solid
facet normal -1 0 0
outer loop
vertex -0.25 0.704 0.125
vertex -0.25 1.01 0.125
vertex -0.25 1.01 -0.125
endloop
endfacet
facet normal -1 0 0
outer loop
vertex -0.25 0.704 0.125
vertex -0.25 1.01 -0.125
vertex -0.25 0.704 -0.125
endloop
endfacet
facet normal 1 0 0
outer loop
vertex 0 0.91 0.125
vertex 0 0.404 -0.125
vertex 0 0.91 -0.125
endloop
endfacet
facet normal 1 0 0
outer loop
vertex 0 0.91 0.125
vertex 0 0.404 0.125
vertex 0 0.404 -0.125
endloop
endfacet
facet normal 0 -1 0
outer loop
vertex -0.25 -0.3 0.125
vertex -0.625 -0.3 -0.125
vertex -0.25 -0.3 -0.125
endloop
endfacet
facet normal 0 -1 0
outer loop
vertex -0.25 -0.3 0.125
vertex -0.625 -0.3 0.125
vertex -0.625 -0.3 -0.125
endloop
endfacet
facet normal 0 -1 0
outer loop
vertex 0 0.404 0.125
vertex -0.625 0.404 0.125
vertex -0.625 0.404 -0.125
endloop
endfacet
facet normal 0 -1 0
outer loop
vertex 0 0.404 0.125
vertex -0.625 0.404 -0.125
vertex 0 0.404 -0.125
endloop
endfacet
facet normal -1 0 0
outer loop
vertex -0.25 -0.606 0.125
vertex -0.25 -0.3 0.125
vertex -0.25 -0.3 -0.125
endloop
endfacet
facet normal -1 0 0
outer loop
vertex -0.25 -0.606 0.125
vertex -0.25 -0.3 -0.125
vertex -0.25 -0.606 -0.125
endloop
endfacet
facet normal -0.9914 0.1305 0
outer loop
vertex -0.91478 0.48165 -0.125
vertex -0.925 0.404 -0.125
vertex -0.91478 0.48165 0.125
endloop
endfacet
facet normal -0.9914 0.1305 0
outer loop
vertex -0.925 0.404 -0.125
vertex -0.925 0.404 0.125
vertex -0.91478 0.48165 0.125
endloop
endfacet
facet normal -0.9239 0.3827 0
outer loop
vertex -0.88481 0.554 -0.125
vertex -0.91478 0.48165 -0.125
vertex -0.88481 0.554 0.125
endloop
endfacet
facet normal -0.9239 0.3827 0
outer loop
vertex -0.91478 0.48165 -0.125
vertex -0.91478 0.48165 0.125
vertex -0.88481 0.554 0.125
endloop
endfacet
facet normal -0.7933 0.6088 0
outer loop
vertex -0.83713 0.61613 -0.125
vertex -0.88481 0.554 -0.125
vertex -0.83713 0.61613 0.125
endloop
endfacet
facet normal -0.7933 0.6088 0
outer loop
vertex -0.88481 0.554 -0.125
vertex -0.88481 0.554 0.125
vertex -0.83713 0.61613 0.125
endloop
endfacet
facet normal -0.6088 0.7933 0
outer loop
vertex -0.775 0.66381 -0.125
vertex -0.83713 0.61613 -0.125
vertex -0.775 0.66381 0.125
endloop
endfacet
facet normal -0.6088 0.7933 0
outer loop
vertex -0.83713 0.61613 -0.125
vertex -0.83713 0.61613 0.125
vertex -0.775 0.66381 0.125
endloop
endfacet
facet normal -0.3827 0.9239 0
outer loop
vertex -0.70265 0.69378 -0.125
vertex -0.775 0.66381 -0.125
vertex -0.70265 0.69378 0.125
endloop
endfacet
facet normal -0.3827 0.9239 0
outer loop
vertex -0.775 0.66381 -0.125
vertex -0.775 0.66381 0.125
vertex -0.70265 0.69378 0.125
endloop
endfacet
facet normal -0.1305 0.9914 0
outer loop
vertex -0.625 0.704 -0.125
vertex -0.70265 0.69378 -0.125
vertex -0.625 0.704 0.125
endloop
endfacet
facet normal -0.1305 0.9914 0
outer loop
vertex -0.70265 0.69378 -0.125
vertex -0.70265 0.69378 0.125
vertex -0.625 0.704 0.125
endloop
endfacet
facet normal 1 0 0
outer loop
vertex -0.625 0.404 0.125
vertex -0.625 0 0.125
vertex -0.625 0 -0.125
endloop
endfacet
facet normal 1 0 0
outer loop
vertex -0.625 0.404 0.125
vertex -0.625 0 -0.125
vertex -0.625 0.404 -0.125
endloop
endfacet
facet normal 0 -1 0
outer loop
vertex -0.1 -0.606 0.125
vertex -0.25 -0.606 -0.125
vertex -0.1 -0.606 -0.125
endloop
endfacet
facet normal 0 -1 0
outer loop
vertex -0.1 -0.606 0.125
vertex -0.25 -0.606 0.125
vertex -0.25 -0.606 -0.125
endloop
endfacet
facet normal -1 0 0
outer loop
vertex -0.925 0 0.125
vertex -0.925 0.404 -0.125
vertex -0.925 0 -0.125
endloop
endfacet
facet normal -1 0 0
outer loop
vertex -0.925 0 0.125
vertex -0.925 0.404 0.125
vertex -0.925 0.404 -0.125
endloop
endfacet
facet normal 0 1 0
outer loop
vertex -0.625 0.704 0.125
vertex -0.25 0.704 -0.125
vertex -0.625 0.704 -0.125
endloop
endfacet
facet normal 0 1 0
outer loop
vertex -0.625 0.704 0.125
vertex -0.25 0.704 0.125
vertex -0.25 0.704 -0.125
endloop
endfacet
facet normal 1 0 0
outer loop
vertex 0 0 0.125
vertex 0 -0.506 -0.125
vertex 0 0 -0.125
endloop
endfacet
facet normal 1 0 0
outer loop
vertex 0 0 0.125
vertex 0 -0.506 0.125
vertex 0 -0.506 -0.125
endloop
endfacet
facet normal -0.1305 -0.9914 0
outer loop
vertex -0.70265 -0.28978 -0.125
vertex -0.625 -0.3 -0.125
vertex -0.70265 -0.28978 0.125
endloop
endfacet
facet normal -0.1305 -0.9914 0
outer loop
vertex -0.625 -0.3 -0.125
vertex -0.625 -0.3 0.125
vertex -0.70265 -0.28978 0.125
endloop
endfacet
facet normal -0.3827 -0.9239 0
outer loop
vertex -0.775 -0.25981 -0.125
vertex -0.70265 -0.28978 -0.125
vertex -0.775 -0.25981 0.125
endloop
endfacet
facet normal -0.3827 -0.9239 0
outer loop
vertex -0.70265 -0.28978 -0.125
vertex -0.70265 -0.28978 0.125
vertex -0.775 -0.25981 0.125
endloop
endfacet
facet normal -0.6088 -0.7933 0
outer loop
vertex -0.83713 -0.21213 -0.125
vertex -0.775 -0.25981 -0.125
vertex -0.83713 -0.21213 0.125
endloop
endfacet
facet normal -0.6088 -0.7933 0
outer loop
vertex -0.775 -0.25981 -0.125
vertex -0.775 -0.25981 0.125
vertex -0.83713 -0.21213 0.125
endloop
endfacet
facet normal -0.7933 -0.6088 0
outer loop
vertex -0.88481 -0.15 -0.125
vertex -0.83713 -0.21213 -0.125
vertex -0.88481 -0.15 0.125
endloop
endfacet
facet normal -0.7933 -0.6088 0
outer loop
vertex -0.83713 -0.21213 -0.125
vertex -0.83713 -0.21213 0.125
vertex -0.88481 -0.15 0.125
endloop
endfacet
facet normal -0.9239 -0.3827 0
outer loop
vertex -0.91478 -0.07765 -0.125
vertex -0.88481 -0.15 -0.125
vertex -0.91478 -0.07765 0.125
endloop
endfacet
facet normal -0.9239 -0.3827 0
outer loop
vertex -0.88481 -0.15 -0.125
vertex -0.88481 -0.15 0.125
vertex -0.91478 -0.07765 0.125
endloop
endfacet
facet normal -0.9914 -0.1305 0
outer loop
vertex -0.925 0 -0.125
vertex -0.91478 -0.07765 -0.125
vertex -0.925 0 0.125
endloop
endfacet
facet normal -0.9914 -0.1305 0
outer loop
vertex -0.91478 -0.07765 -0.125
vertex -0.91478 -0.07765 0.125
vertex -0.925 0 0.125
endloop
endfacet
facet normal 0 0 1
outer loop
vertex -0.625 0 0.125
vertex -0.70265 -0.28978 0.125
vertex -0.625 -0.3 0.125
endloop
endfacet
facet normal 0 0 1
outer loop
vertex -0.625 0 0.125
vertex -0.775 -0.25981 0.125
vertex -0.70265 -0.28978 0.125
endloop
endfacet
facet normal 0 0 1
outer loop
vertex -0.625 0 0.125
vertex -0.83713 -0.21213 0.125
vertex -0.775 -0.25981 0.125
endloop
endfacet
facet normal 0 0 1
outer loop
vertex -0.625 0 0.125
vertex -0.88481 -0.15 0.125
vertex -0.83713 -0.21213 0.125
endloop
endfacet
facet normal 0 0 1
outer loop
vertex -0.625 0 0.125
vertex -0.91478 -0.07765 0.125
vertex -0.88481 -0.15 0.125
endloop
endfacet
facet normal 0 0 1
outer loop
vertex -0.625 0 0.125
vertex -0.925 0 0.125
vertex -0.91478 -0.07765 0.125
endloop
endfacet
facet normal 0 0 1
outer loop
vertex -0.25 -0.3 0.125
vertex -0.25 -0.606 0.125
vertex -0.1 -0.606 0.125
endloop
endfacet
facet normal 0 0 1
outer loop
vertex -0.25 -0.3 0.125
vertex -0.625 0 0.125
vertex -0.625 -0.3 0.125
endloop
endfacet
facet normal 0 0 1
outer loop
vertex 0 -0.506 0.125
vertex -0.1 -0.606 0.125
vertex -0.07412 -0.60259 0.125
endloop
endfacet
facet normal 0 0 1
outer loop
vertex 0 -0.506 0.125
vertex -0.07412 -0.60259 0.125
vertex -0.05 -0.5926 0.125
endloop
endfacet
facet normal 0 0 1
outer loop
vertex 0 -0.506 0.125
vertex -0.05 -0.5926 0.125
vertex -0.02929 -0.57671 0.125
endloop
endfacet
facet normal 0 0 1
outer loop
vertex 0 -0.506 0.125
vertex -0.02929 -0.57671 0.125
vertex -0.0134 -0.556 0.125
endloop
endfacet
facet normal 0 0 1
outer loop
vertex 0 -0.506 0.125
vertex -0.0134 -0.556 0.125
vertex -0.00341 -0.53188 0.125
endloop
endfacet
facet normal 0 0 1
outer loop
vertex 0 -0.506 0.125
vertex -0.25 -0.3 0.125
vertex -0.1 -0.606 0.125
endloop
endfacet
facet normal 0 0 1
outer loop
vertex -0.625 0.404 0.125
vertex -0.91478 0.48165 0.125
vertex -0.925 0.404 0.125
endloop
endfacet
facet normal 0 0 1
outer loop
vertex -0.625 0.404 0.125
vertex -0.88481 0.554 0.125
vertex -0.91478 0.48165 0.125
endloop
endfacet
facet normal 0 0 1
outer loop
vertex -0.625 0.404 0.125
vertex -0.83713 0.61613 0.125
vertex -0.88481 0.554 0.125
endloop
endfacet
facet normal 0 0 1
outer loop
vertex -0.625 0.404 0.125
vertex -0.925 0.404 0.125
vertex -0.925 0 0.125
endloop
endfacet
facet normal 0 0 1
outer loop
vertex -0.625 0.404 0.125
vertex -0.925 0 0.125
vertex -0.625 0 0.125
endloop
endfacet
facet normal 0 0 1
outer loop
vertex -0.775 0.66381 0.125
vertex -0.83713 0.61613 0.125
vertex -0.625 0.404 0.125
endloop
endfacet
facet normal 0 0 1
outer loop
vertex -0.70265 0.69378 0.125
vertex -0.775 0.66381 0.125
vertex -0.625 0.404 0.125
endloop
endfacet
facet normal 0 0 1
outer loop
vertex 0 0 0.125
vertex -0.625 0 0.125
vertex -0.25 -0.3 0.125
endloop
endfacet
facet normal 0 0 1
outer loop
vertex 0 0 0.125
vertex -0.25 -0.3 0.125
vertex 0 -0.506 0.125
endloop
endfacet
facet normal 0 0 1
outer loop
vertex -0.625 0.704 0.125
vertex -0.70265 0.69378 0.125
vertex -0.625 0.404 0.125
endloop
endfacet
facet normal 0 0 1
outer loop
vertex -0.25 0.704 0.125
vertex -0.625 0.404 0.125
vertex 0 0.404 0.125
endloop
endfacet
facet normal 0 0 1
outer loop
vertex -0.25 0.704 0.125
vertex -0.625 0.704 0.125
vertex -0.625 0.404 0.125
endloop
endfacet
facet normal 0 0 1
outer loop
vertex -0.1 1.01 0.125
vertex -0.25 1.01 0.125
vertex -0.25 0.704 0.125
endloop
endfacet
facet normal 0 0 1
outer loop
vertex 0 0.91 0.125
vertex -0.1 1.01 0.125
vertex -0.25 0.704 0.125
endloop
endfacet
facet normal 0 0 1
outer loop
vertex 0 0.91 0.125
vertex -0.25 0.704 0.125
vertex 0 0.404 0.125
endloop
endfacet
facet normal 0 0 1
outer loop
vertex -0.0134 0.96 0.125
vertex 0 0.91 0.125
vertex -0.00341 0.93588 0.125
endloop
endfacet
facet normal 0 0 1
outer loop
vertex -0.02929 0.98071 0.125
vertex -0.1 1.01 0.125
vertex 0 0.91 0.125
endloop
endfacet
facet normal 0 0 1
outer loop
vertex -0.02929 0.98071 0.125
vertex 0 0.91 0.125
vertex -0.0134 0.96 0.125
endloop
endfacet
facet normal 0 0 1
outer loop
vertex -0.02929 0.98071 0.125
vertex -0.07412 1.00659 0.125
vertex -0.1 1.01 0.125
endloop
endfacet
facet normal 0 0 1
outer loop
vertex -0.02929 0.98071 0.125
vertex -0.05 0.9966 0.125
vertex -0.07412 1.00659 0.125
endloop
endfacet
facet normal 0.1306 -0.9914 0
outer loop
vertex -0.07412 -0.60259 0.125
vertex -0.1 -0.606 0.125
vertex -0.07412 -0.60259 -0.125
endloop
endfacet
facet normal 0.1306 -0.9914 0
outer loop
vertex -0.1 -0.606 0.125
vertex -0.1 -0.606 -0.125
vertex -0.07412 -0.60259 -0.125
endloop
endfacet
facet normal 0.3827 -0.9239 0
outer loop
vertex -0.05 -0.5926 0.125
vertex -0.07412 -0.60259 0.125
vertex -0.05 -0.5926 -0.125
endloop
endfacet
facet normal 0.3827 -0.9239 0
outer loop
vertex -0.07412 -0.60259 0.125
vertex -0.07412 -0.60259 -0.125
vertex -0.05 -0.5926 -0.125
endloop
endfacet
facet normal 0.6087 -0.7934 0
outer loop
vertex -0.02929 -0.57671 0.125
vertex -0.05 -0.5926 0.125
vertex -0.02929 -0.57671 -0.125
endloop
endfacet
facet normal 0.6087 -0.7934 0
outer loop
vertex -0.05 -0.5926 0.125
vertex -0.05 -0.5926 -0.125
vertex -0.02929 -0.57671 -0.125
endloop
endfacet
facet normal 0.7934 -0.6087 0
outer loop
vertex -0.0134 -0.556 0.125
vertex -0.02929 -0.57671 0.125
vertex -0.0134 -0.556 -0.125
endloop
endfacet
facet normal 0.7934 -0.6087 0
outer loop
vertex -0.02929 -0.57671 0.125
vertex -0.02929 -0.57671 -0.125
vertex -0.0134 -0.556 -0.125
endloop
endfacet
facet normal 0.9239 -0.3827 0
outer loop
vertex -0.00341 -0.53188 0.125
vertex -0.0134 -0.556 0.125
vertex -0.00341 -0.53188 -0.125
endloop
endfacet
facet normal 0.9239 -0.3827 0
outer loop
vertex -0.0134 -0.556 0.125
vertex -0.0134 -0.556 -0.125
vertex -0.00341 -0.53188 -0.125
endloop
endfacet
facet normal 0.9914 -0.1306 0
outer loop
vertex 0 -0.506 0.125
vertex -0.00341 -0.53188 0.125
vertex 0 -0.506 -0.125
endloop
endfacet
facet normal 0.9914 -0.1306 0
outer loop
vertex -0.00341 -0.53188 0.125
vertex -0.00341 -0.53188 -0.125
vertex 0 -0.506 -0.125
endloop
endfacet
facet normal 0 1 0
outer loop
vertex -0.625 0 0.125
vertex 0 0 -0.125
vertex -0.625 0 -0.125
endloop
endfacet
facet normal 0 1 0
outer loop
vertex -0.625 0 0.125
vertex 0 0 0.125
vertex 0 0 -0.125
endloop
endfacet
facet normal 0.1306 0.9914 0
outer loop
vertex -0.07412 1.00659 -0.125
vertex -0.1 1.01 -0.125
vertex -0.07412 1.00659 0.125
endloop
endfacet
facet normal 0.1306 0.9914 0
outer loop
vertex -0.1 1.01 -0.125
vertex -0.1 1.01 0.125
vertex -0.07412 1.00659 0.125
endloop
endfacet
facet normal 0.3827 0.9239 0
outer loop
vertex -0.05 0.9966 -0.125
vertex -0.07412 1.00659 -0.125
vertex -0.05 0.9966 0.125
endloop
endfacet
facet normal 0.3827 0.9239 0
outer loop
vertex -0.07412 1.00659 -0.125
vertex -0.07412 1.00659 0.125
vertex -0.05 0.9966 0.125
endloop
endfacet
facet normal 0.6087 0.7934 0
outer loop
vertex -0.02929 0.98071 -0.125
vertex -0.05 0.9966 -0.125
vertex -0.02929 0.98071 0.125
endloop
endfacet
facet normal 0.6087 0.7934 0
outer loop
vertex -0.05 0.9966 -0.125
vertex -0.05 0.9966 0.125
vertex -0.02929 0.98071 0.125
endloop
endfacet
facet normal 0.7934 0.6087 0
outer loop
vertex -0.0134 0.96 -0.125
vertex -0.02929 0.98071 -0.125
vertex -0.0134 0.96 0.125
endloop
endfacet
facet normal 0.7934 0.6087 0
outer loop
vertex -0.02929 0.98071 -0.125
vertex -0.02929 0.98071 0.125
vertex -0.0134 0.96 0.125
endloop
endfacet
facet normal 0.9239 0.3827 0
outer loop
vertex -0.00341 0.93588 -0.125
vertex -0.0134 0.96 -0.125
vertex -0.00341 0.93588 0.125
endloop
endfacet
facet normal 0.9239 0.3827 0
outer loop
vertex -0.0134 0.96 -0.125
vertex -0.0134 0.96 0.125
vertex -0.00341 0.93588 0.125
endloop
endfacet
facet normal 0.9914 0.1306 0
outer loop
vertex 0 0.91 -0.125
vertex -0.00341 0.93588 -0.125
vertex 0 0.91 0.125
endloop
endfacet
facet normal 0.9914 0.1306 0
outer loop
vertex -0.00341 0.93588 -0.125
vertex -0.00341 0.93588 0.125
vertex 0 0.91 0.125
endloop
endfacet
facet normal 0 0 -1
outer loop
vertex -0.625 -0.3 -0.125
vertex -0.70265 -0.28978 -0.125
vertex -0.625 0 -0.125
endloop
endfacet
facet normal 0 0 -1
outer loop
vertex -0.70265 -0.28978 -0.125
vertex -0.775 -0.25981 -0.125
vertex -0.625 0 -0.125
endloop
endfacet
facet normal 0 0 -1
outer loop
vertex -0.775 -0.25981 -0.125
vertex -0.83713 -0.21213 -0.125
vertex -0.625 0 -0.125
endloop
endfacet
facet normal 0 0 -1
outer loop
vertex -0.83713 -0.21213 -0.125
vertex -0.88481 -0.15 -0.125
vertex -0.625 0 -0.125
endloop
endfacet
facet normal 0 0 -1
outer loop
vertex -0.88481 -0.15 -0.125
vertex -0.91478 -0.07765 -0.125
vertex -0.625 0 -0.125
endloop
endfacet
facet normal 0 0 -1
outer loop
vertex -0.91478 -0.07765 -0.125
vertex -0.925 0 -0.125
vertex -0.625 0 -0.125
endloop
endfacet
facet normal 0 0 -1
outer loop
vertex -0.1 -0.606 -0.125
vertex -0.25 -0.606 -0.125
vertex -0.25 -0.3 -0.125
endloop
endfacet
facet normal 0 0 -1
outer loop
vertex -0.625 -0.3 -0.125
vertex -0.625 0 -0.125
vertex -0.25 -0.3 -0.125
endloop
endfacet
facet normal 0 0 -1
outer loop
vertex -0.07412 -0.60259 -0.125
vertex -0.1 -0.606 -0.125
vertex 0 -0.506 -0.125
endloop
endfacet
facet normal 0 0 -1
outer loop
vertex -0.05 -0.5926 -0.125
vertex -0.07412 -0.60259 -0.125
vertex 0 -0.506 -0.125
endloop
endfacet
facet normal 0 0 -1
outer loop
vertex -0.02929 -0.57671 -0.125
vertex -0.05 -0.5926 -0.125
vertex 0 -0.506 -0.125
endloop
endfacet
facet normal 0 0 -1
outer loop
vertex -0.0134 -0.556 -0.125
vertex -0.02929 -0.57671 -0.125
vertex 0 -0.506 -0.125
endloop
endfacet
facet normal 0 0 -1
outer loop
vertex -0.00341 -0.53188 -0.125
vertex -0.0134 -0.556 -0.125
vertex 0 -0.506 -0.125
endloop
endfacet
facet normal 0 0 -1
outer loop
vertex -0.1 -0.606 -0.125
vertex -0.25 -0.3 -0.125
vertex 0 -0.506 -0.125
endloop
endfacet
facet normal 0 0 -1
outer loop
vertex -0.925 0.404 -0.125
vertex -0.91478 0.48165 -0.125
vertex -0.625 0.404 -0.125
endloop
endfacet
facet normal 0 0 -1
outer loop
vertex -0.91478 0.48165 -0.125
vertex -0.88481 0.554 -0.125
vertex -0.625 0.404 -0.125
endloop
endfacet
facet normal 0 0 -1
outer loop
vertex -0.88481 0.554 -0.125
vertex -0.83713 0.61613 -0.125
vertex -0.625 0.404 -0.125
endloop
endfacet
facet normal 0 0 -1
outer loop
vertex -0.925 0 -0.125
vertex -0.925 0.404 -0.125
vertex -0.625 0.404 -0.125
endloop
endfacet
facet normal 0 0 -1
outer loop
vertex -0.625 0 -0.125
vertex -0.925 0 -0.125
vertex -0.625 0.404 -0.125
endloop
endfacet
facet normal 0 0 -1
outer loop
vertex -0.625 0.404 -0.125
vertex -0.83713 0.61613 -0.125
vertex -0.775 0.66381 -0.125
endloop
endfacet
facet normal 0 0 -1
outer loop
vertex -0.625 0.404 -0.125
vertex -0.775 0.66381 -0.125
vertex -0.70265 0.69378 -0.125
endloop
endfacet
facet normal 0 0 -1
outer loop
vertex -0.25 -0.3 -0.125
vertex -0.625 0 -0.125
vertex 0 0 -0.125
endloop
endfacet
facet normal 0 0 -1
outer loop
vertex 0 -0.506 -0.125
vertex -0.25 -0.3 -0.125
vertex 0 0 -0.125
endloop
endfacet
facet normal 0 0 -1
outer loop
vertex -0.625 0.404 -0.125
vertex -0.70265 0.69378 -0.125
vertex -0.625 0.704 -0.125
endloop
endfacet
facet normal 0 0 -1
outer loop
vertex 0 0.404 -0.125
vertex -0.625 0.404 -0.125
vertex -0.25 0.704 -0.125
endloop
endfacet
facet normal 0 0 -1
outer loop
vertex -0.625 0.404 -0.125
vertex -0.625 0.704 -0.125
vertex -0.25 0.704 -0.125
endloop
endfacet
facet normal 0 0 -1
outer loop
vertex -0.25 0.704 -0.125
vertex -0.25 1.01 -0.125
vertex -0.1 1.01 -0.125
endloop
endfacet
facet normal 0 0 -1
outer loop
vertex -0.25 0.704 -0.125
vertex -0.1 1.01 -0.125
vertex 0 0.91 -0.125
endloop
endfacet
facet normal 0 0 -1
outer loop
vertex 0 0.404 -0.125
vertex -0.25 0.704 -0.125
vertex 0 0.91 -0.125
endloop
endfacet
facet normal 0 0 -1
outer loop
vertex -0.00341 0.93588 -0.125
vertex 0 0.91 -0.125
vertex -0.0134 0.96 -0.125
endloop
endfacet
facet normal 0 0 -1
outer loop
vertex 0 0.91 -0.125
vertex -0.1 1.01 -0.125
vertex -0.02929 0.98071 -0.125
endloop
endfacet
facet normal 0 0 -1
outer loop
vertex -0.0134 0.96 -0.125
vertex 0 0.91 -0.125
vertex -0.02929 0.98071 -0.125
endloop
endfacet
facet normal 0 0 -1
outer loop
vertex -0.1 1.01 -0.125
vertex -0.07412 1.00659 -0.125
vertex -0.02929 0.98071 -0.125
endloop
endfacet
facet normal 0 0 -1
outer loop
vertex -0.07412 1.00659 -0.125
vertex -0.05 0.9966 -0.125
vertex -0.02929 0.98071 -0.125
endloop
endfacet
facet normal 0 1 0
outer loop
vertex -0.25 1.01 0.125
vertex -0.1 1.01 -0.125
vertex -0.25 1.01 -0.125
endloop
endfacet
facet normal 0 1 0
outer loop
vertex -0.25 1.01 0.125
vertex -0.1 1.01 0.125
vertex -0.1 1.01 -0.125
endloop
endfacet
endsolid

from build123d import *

# Parameters (mm, degrees)
BOSS_EXTRUDE1_DEPTH = 0.125
FILLET1_R           = 0.3
FILLET2_R           = 0.1


with BuildPart() as part:
    # frame_outline → Boss-Extrude1 (new, symmetric)
    with BuildSketch(Plane.XY):
        Polygon((0, 0), (-0.625, 0), (-0.625, 0.404), (0, 0.404), (0, 1.01), (-0.25, 1.01), (-0.25, 0.704), (-0.925, 0.704), (-0.925, -0.3), (-0.25, -0.3), (-0.25, -0.606), (0, -0.606), align=None)
    extrude(amount=BOSS_EXTRUDE1_DEPTH, both=True)

    # Fillet1
    fillet1_edges = [part.edges().sort_by_distance(p)[0] for p in [
        (-0.925, -0.3, 0),
        (-0.925, 0.704, 0),
    ]]
    fillet(fillet1_edges, radius=FILLET1_R)

    # Fillet2
    fillet2_edges = [part.edges().sort_by_distance(p)[0] for p in [
        (0, -0.606, 0),
        (0, 1.01, 0),
    ]]
    fillet(fillet2_edges, radius=FILLET2_R)


solid = part.part
